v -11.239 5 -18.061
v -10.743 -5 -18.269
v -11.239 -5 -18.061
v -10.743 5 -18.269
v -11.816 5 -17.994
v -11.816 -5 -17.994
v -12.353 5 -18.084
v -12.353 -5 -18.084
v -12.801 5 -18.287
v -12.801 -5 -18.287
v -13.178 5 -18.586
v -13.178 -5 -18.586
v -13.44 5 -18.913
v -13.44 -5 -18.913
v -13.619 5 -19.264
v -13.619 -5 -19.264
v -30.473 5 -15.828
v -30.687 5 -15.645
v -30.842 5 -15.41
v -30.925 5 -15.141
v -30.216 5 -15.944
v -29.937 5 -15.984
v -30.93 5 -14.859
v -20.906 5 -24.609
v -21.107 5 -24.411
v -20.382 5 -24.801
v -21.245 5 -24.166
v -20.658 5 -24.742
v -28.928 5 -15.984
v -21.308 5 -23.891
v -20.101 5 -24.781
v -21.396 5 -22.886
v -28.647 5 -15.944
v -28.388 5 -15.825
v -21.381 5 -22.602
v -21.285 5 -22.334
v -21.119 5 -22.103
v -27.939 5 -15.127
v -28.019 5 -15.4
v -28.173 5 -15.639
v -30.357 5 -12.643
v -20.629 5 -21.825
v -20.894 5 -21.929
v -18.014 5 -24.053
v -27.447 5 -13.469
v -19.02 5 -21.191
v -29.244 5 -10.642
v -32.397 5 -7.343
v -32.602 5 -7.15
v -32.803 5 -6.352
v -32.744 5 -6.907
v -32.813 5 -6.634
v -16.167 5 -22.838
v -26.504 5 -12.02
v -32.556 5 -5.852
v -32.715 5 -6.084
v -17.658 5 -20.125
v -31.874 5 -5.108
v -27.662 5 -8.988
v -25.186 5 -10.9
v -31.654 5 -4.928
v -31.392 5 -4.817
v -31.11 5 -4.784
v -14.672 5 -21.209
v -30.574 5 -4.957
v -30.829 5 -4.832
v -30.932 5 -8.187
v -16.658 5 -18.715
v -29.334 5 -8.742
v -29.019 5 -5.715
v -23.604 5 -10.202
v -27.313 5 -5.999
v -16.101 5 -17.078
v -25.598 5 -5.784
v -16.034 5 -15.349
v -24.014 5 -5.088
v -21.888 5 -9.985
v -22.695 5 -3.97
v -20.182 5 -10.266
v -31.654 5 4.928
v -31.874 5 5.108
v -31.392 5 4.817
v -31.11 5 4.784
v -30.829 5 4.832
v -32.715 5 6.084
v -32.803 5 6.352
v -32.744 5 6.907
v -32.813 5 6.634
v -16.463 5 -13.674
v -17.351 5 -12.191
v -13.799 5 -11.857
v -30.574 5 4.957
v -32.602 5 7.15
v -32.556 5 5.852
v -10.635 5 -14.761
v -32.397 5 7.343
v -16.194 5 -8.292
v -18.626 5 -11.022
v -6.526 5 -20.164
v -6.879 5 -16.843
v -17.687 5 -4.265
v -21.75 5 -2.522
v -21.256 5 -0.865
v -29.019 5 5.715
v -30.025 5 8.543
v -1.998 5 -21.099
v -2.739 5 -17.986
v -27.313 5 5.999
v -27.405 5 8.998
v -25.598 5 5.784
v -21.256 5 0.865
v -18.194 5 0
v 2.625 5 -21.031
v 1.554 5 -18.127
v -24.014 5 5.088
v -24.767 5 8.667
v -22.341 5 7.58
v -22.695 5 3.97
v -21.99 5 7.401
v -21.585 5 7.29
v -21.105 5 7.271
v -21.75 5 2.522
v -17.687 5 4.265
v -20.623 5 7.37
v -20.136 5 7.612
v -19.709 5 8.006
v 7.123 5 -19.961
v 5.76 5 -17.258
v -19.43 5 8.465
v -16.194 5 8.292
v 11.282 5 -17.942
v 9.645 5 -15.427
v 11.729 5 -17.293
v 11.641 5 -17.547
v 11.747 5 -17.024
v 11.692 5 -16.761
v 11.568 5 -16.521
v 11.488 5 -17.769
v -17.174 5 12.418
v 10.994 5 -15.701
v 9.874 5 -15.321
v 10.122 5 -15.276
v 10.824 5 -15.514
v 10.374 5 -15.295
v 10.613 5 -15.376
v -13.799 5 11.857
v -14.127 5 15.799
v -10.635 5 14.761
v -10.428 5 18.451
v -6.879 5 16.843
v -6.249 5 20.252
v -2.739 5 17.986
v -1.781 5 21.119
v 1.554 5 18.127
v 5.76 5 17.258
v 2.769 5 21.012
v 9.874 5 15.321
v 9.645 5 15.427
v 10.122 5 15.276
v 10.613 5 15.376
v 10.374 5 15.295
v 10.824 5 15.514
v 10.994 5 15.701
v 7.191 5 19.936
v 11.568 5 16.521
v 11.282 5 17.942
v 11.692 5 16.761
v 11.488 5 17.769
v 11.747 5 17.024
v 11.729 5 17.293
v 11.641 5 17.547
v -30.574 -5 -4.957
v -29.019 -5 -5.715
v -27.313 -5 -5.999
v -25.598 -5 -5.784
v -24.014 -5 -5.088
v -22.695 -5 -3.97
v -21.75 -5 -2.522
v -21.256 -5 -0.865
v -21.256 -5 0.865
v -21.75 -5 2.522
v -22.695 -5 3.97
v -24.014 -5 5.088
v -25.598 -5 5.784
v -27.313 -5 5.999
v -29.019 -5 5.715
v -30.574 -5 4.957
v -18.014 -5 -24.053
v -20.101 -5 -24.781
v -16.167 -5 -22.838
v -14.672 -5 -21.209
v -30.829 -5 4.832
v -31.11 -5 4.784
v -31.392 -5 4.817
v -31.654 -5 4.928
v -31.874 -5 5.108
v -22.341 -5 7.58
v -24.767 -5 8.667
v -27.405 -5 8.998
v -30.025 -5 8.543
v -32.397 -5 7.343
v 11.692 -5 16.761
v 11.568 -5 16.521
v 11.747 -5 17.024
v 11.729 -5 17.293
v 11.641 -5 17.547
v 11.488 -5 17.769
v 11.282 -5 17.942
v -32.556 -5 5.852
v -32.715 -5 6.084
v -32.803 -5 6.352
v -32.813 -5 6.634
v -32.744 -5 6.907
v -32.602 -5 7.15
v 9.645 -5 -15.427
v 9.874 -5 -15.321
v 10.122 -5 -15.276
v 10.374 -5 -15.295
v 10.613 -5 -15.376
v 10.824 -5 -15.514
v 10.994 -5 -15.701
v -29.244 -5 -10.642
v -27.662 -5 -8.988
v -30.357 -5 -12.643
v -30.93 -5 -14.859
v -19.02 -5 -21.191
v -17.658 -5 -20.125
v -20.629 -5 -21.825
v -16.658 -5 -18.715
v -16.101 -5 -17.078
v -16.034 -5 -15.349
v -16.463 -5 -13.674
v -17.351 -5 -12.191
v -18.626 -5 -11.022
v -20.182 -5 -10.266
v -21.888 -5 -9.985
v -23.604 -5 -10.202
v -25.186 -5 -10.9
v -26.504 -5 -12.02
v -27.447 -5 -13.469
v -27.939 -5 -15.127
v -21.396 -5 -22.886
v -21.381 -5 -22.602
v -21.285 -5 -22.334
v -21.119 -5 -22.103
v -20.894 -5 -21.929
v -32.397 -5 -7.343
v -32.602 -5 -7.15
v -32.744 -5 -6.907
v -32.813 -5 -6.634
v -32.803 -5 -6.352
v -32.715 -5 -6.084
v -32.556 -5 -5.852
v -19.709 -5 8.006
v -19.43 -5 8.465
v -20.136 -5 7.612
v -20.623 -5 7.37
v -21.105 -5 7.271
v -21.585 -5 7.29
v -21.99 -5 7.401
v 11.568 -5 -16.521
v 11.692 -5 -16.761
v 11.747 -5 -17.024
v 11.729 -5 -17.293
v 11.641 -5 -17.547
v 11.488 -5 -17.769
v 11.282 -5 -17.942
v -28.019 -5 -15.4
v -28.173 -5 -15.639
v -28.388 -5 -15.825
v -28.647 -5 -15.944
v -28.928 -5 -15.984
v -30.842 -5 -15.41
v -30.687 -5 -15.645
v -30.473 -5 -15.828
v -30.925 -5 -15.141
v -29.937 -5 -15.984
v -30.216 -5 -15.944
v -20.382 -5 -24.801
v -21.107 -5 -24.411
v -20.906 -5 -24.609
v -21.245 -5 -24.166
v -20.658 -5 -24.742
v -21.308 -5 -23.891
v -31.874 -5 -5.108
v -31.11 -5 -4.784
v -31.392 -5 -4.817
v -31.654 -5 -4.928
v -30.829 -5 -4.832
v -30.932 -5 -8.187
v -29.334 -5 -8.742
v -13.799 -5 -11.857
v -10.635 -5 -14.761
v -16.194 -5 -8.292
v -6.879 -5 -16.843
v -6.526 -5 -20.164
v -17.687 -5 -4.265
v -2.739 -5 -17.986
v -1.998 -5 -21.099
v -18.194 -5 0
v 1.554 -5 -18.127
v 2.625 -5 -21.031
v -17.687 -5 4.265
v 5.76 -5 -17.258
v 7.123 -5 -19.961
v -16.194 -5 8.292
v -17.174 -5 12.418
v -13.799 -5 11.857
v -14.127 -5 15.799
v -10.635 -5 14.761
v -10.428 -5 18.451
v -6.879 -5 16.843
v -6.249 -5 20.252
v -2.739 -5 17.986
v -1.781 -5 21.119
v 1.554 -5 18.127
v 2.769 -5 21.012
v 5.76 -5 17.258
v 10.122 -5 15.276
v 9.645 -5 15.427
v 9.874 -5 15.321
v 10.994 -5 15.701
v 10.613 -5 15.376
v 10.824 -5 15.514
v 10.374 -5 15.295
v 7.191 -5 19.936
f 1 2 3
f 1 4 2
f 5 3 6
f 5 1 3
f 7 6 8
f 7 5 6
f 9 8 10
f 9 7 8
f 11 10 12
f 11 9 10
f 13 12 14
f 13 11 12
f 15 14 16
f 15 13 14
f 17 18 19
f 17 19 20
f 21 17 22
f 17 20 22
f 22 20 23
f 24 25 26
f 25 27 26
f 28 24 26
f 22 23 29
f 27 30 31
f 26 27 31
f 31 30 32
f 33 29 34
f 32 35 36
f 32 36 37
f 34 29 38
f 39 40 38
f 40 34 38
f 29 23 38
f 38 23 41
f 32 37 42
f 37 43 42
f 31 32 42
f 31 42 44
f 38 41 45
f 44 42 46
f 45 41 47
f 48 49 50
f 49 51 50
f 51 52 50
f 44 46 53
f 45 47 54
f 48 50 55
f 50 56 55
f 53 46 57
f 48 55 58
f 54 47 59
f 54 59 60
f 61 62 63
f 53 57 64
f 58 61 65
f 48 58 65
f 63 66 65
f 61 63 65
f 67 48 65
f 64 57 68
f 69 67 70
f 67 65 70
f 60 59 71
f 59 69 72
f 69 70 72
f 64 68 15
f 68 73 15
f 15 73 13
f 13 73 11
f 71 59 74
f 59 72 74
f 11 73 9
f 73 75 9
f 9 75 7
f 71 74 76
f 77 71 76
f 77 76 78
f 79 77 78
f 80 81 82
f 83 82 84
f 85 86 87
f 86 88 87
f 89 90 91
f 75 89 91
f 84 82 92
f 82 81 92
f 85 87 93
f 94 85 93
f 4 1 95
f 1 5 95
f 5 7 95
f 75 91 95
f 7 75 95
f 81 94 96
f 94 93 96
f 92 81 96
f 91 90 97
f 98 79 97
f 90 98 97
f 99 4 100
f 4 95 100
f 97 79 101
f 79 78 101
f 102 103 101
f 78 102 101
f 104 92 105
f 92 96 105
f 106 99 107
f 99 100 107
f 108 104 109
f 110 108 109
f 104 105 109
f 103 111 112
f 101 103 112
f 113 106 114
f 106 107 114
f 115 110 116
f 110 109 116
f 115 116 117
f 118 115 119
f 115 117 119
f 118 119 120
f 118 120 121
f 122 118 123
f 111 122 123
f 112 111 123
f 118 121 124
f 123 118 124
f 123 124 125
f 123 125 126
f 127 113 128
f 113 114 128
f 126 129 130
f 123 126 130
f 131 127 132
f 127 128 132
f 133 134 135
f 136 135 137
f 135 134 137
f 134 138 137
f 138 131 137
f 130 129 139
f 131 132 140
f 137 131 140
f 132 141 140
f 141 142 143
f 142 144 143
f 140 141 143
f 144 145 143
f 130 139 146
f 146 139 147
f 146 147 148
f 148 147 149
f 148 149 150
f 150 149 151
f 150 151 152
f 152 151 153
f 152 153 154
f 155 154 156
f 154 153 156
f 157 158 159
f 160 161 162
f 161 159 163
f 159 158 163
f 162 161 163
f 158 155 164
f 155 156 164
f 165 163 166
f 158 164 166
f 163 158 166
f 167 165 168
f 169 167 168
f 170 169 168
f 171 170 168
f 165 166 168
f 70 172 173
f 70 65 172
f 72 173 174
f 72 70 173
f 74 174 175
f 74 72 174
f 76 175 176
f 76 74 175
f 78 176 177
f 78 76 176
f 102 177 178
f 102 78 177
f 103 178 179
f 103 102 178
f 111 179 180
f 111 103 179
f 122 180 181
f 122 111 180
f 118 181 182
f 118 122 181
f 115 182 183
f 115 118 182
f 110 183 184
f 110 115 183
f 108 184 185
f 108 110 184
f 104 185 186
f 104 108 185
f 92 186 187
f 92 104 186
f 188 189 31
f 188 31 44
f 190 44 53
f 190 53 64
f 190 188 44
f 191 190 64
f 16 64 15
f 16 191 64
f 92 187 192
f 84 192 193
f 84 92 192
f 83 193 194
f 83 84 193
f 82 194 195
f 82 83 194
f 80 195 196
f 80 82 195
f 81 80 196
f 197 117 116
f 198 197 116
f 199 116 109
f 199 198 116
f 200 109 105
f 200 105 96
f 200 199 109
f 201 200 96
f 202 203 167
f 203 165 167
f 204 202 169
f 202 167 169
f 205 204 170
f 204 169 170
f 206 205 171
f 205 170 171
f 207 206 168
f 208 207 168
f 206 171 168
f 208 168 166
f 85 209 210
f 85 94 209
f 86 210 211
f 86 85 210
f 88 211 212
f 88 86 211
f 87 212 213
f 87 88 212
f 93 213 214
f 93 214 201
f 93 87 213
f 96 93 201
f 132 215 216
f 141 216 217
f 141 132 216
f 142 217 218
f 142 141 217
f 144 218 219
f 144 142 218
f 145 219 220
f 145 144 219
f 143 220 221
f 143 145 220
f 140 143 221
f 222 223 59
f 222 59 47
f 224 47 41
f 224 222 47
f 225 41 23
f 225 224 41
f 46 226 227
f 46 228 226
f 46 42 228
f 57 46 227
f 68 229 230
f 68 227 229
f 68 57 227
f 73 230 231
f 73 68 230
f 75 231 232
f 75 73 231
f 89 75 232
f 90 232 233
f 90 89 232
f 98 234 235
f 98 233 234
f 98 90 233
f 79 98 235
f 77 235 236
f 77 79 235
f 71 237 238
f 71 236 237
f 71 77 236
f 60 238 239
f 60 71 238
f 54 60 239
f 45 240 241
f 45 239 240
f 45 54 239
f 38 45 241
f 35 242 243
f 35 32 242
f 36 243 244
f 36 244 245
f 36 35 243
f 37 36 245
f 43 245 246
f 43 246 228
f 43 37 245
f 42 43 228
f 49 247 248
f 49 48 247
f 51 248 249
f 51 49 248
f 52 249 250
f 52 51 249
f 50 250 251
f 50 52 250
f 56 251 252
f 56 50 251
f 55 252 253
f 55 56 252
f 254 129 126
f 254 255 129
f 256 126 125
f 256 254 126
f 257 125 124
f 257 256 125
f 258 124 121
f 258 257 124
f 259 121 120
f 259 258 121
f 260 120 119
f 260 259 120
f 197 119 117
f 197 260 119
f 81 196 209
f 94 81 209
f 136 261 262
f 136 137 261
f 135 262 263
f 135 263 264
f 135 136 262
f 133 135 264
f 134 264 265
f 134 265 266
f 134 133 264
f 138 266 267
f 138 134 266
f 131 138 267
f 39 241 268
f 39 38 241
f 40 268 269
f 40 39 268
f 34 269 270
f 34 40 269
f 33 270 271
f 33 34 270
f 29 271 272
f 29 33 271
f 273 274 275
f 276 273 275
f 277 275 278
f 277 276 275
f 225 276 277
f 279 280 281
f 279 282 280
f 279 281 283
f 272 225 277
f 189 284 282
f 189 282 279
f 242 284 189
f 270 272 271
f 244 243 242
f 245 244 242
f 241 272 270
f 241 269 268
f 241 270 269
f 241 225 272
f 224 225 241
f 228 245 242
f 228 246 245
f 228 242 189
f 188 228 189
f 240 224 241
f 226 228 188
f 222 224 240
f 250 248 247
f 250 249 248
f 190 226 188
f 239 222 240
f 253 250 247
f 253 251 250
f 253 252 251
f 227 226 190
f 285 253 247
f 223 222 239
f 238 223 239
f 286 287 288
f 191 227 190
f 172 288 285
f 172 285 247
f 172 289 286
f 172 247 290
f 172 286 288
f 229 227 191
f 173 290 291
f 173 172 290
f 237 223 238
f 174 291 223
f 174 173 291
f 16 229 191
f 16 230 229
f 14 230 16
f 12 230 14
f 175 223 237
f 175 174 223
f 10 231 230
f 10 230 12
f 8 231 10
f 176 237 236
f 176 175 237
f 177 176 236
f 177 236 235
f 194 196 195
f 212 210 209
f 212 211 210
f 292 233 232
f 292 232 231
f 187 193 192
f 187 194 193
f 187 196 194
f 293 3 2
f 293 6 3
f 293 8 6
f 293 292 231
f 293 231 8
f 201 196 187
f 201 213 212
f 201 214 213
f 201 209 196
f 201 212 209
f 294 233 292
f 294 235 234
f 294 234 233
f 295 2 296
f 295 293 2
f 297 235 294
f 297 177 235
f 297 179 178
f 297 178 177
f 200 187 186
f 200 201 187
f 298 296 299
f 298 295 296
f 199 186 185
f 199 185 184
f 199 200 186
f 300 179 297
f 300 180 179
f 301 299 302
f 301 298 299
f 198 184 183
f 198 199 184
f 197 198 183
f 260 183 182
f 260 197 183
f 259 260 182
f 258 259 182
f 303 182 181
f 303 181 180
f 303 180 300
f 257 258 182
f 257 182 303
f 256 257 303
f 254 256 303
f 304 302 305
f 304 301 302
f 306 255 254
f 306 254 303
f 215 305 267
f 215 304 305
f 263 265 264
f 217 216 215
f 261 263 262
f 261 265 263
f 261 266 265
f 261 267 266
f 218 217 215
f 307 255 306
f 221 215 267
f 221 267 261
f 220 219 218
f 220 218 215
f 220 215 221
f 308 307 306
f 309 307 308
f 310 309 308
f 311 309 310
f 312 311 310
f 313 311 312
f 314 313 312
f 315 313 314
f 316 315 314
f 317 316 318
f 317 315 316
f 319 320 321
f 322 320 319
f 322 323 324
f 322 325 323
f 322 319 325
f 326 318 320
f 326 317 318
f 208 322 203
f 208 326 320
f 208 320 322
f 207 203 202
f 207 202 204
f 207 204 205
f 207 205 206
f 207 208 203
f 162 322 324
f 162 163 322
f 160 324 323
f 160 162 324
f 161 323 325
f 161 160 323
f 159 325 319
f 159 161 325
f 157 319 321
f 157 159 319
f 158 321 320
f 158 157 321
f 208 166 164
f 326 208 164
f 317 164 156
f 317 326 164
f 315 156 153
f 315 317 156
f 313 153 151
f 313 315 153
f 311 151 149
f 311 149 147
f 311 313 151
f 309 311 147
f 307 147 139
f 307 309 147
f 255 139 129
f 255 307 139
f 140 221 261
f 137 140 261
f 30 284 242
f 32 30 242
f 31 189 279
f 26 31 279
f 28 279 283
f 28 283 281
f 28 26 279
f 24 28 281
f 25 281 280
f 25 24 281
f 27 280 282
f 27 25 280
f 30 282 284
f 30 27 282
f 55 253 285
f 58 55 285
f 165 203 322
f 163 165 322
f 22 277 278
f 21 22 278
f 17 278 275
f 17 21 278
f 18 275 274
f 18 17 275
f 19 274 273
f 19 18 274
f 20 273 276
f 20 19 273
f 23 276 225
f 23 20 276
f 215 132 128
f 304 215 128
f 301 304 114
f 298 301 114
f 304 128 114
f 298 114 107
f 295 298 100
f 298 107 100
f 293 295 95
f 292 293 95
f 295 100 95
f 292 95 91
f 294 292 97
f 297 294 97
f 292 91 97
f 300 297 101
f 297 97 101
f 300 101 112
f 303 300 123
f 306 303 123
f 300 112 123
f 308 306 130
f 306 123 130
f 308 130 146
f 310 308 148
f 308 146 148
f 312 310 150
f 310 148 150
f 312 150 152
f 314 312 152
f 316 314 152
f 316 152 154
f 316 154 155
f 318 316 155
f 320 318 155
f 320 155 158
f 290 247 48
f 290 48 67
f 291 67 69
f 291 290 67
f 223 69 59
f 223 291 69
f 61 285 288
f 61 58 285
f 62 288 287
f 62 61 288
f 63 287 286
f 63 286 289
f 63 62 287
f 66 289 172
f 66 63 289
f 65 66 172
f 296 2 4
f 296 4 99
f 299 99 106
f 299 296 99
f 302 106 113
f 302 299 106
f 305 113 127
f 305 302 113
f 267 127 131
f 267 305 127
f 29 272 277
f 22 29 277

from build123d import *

# Parameters (mm, degrees)
F0_R     = 6
F1_DEPTH = 5
F2_R     = 2
F3_COUNT = 2
F3_ANGLE = 36
F5_DEPTH = 10.0010001
F6_R     = 1


with BuildPart() as f1:
    # F0 (on Front) → F1 (new body, symmetric)
    with BuildSketch(Plane.XZ):
        with BuildLine():
            ThreePointArc((-20.3662859317, 5.8640119715), (-18.7542946844, 3.1267729293), (-18.1936839424, 0))
            ThreePointArc((-18.1936839424, 0), (-18.7542946844, -3.1267729293), (-20.3662859317, -5.8640119715))
            ThreePointArc((-20.3662859317, -5.8640119715), (2.9610481198, -20.9858150446), (21.1936839424, 0))
            ThreePointArc((21.1936839424, 0), (2.9610481198, 20.9858150446), (-20.3662859317, 5.8640119715))
        make_face()
        with BuildLine():
            ThreePointArc((-18.1936839424, 0), (0, 18.1936839424), (18.1936839424, 0))
            ThreePointArc((18.1936839424, 0), (0, -18.1936839424), (-18.1936839424, 0))
        make_face(mode=Mode.SUBTRACT)
        with BuildLine():
            ThreePointArc((-20.3662859317, -5.8640119715), (-18.7542946844, -3.1267729293), (-18.1936839424, 0))
            ThreePointArc((-18.1936839424, 0), (-18.7542946844, 3.1267729293), (-20.3662859317, 5.8640119715))
            ThreePointArc((-20.3662859317, 5.8640119715), (-20.9858150446, 2.9610481198), (-21.1936839424, 0))
            ThreePointArc((-21.1936839424, 0), (-20.9858150446, -2.9610481198), (-20.3662859317, -5.8640119715))
        make_face()
        with BuildLine():
            ThreePointArc((-21.1936839424, 0), (-20.9858150446, 2.9610481198), (-20.3662859317, 5.8640119715))
            ThreePointArc((-20.3662859317, 5.8640119715), (-36.1936839424, 0), (-20.3662859317, -5.8640119715))
            ThreePointArc((-20.3662859317, -5.8640119715), (-20.9858150446, -2.9610481198), (-21.1936839424, 0))
        make_face()
        with Locations((-27.1936839424, 0)):
            Circle(F0_R, mode=Mode.SUBTRACT)
    extrude(amount=F1_DEPTH, both=True)

    # F2
    f2_edges = [f1.edges().sort_by_distance(p)[0] for p in [
        (-20.366286, 0, 5.864012),
        (-20.366286, 0, -5.864012),
    ]]
    fillet(f2_edges, radius=F2_R)

    # F3: F1 ×2 about axis
    f3_axis = Axis((0, 0, 0), (0, -1, 0))


with BuildPart() as f1_1:
    add(f1.part)
    for i in range(1, F3_COUNT):
        add(f1.part.rotate(f3_axis, i * F3_ANGLE / (F3_COUNT - 1)))

    # F4 (on face) → F5 (cut, through all)
    with BuildSketch(Plane.XZ.offset(5)):
        with BuildLine():
            ThreePointArc((-31.2472251881, -4.4236640209), (-33.1936839424, 0), (-31.2472251881, 4.4236640209))
            Line((-31.2472251881, 4.4236640209), (-33.273995811, 6.6354960313))
            ThreePointArc((-33.273995811, 6.6354960313), (-36.1936839424, 0), (-33.273995811, -6.6354960313))
            Line((-33.273995811, -6.6354960313), (-31.2472251881, -4.4236640209))
        make_face()
        with BuildLine():
            ThreePointArc((12.1561977089, -17.3608495275), (21.1936839424, 0), (12.1561977089, 17.3608495275))
            Line((12.1561977089, 17.3608495275), (10.4354683998, 14.9033933946))
            ThreePointArc((10.4354683998, 14.9033933946), (16.1379947524, 8.4009083301), (18.1936839424, 0))
            ThreePointArc((18.1936839424, 0), (16.1379947524, -8.4009083301), (10.4354683998, -14.9033933946))
            Line((10.4354683998, -14.9033933946), (12.1561977089, -17.3608495275))
        make_face()
        with BuildLine():
            Line((-28.0001524491, -15.9840463769), (-31.0001524491, -15.9840463769))
            ThreePointArc((-31.0001524491, -15.9840463769), (-28.0804643176, -22.6195424082), (-21.2157507644, -24.9497986597))
            Line((-21.2157507644, -24.9497986597), (-21.4772179926, -21.9612145654))
            ThreePointArc((-21.4772179926, -21.9612145654), (-26.0536936948, -20.4077103977), (-28.0001524491, -15.9840463769))
        make_face()
    extrude(amount=-F5_DEPTH, mode=Mode.SUBTRACT)

    # F6
    f6_edges = [f1_1.edges().sort_by_distance(p)[0] for p in [
        (-31.247225, 0, 4.423664),
        (-33.273996, 0, 6.635496),
        (-33.273996, 0, -6.635496),
        (-31.247225, 0, -4.423664),
        (10.435468, 0, 14.903393),
        (12.156198, 0, 17.36085),
        (12.156198, 0, -17.36085),
        (10.435468, 0, -14.903393),
        (-28.000152, 0, -15.984046),
        (-31.000152, 0, -15.984046),
        (-21.477218, 0, -21.961215),
        (-21.215751, 0, -24.949799),
    ]]
    fillet(f6_edges, radius=F6_R)


solid = f1_1.part
